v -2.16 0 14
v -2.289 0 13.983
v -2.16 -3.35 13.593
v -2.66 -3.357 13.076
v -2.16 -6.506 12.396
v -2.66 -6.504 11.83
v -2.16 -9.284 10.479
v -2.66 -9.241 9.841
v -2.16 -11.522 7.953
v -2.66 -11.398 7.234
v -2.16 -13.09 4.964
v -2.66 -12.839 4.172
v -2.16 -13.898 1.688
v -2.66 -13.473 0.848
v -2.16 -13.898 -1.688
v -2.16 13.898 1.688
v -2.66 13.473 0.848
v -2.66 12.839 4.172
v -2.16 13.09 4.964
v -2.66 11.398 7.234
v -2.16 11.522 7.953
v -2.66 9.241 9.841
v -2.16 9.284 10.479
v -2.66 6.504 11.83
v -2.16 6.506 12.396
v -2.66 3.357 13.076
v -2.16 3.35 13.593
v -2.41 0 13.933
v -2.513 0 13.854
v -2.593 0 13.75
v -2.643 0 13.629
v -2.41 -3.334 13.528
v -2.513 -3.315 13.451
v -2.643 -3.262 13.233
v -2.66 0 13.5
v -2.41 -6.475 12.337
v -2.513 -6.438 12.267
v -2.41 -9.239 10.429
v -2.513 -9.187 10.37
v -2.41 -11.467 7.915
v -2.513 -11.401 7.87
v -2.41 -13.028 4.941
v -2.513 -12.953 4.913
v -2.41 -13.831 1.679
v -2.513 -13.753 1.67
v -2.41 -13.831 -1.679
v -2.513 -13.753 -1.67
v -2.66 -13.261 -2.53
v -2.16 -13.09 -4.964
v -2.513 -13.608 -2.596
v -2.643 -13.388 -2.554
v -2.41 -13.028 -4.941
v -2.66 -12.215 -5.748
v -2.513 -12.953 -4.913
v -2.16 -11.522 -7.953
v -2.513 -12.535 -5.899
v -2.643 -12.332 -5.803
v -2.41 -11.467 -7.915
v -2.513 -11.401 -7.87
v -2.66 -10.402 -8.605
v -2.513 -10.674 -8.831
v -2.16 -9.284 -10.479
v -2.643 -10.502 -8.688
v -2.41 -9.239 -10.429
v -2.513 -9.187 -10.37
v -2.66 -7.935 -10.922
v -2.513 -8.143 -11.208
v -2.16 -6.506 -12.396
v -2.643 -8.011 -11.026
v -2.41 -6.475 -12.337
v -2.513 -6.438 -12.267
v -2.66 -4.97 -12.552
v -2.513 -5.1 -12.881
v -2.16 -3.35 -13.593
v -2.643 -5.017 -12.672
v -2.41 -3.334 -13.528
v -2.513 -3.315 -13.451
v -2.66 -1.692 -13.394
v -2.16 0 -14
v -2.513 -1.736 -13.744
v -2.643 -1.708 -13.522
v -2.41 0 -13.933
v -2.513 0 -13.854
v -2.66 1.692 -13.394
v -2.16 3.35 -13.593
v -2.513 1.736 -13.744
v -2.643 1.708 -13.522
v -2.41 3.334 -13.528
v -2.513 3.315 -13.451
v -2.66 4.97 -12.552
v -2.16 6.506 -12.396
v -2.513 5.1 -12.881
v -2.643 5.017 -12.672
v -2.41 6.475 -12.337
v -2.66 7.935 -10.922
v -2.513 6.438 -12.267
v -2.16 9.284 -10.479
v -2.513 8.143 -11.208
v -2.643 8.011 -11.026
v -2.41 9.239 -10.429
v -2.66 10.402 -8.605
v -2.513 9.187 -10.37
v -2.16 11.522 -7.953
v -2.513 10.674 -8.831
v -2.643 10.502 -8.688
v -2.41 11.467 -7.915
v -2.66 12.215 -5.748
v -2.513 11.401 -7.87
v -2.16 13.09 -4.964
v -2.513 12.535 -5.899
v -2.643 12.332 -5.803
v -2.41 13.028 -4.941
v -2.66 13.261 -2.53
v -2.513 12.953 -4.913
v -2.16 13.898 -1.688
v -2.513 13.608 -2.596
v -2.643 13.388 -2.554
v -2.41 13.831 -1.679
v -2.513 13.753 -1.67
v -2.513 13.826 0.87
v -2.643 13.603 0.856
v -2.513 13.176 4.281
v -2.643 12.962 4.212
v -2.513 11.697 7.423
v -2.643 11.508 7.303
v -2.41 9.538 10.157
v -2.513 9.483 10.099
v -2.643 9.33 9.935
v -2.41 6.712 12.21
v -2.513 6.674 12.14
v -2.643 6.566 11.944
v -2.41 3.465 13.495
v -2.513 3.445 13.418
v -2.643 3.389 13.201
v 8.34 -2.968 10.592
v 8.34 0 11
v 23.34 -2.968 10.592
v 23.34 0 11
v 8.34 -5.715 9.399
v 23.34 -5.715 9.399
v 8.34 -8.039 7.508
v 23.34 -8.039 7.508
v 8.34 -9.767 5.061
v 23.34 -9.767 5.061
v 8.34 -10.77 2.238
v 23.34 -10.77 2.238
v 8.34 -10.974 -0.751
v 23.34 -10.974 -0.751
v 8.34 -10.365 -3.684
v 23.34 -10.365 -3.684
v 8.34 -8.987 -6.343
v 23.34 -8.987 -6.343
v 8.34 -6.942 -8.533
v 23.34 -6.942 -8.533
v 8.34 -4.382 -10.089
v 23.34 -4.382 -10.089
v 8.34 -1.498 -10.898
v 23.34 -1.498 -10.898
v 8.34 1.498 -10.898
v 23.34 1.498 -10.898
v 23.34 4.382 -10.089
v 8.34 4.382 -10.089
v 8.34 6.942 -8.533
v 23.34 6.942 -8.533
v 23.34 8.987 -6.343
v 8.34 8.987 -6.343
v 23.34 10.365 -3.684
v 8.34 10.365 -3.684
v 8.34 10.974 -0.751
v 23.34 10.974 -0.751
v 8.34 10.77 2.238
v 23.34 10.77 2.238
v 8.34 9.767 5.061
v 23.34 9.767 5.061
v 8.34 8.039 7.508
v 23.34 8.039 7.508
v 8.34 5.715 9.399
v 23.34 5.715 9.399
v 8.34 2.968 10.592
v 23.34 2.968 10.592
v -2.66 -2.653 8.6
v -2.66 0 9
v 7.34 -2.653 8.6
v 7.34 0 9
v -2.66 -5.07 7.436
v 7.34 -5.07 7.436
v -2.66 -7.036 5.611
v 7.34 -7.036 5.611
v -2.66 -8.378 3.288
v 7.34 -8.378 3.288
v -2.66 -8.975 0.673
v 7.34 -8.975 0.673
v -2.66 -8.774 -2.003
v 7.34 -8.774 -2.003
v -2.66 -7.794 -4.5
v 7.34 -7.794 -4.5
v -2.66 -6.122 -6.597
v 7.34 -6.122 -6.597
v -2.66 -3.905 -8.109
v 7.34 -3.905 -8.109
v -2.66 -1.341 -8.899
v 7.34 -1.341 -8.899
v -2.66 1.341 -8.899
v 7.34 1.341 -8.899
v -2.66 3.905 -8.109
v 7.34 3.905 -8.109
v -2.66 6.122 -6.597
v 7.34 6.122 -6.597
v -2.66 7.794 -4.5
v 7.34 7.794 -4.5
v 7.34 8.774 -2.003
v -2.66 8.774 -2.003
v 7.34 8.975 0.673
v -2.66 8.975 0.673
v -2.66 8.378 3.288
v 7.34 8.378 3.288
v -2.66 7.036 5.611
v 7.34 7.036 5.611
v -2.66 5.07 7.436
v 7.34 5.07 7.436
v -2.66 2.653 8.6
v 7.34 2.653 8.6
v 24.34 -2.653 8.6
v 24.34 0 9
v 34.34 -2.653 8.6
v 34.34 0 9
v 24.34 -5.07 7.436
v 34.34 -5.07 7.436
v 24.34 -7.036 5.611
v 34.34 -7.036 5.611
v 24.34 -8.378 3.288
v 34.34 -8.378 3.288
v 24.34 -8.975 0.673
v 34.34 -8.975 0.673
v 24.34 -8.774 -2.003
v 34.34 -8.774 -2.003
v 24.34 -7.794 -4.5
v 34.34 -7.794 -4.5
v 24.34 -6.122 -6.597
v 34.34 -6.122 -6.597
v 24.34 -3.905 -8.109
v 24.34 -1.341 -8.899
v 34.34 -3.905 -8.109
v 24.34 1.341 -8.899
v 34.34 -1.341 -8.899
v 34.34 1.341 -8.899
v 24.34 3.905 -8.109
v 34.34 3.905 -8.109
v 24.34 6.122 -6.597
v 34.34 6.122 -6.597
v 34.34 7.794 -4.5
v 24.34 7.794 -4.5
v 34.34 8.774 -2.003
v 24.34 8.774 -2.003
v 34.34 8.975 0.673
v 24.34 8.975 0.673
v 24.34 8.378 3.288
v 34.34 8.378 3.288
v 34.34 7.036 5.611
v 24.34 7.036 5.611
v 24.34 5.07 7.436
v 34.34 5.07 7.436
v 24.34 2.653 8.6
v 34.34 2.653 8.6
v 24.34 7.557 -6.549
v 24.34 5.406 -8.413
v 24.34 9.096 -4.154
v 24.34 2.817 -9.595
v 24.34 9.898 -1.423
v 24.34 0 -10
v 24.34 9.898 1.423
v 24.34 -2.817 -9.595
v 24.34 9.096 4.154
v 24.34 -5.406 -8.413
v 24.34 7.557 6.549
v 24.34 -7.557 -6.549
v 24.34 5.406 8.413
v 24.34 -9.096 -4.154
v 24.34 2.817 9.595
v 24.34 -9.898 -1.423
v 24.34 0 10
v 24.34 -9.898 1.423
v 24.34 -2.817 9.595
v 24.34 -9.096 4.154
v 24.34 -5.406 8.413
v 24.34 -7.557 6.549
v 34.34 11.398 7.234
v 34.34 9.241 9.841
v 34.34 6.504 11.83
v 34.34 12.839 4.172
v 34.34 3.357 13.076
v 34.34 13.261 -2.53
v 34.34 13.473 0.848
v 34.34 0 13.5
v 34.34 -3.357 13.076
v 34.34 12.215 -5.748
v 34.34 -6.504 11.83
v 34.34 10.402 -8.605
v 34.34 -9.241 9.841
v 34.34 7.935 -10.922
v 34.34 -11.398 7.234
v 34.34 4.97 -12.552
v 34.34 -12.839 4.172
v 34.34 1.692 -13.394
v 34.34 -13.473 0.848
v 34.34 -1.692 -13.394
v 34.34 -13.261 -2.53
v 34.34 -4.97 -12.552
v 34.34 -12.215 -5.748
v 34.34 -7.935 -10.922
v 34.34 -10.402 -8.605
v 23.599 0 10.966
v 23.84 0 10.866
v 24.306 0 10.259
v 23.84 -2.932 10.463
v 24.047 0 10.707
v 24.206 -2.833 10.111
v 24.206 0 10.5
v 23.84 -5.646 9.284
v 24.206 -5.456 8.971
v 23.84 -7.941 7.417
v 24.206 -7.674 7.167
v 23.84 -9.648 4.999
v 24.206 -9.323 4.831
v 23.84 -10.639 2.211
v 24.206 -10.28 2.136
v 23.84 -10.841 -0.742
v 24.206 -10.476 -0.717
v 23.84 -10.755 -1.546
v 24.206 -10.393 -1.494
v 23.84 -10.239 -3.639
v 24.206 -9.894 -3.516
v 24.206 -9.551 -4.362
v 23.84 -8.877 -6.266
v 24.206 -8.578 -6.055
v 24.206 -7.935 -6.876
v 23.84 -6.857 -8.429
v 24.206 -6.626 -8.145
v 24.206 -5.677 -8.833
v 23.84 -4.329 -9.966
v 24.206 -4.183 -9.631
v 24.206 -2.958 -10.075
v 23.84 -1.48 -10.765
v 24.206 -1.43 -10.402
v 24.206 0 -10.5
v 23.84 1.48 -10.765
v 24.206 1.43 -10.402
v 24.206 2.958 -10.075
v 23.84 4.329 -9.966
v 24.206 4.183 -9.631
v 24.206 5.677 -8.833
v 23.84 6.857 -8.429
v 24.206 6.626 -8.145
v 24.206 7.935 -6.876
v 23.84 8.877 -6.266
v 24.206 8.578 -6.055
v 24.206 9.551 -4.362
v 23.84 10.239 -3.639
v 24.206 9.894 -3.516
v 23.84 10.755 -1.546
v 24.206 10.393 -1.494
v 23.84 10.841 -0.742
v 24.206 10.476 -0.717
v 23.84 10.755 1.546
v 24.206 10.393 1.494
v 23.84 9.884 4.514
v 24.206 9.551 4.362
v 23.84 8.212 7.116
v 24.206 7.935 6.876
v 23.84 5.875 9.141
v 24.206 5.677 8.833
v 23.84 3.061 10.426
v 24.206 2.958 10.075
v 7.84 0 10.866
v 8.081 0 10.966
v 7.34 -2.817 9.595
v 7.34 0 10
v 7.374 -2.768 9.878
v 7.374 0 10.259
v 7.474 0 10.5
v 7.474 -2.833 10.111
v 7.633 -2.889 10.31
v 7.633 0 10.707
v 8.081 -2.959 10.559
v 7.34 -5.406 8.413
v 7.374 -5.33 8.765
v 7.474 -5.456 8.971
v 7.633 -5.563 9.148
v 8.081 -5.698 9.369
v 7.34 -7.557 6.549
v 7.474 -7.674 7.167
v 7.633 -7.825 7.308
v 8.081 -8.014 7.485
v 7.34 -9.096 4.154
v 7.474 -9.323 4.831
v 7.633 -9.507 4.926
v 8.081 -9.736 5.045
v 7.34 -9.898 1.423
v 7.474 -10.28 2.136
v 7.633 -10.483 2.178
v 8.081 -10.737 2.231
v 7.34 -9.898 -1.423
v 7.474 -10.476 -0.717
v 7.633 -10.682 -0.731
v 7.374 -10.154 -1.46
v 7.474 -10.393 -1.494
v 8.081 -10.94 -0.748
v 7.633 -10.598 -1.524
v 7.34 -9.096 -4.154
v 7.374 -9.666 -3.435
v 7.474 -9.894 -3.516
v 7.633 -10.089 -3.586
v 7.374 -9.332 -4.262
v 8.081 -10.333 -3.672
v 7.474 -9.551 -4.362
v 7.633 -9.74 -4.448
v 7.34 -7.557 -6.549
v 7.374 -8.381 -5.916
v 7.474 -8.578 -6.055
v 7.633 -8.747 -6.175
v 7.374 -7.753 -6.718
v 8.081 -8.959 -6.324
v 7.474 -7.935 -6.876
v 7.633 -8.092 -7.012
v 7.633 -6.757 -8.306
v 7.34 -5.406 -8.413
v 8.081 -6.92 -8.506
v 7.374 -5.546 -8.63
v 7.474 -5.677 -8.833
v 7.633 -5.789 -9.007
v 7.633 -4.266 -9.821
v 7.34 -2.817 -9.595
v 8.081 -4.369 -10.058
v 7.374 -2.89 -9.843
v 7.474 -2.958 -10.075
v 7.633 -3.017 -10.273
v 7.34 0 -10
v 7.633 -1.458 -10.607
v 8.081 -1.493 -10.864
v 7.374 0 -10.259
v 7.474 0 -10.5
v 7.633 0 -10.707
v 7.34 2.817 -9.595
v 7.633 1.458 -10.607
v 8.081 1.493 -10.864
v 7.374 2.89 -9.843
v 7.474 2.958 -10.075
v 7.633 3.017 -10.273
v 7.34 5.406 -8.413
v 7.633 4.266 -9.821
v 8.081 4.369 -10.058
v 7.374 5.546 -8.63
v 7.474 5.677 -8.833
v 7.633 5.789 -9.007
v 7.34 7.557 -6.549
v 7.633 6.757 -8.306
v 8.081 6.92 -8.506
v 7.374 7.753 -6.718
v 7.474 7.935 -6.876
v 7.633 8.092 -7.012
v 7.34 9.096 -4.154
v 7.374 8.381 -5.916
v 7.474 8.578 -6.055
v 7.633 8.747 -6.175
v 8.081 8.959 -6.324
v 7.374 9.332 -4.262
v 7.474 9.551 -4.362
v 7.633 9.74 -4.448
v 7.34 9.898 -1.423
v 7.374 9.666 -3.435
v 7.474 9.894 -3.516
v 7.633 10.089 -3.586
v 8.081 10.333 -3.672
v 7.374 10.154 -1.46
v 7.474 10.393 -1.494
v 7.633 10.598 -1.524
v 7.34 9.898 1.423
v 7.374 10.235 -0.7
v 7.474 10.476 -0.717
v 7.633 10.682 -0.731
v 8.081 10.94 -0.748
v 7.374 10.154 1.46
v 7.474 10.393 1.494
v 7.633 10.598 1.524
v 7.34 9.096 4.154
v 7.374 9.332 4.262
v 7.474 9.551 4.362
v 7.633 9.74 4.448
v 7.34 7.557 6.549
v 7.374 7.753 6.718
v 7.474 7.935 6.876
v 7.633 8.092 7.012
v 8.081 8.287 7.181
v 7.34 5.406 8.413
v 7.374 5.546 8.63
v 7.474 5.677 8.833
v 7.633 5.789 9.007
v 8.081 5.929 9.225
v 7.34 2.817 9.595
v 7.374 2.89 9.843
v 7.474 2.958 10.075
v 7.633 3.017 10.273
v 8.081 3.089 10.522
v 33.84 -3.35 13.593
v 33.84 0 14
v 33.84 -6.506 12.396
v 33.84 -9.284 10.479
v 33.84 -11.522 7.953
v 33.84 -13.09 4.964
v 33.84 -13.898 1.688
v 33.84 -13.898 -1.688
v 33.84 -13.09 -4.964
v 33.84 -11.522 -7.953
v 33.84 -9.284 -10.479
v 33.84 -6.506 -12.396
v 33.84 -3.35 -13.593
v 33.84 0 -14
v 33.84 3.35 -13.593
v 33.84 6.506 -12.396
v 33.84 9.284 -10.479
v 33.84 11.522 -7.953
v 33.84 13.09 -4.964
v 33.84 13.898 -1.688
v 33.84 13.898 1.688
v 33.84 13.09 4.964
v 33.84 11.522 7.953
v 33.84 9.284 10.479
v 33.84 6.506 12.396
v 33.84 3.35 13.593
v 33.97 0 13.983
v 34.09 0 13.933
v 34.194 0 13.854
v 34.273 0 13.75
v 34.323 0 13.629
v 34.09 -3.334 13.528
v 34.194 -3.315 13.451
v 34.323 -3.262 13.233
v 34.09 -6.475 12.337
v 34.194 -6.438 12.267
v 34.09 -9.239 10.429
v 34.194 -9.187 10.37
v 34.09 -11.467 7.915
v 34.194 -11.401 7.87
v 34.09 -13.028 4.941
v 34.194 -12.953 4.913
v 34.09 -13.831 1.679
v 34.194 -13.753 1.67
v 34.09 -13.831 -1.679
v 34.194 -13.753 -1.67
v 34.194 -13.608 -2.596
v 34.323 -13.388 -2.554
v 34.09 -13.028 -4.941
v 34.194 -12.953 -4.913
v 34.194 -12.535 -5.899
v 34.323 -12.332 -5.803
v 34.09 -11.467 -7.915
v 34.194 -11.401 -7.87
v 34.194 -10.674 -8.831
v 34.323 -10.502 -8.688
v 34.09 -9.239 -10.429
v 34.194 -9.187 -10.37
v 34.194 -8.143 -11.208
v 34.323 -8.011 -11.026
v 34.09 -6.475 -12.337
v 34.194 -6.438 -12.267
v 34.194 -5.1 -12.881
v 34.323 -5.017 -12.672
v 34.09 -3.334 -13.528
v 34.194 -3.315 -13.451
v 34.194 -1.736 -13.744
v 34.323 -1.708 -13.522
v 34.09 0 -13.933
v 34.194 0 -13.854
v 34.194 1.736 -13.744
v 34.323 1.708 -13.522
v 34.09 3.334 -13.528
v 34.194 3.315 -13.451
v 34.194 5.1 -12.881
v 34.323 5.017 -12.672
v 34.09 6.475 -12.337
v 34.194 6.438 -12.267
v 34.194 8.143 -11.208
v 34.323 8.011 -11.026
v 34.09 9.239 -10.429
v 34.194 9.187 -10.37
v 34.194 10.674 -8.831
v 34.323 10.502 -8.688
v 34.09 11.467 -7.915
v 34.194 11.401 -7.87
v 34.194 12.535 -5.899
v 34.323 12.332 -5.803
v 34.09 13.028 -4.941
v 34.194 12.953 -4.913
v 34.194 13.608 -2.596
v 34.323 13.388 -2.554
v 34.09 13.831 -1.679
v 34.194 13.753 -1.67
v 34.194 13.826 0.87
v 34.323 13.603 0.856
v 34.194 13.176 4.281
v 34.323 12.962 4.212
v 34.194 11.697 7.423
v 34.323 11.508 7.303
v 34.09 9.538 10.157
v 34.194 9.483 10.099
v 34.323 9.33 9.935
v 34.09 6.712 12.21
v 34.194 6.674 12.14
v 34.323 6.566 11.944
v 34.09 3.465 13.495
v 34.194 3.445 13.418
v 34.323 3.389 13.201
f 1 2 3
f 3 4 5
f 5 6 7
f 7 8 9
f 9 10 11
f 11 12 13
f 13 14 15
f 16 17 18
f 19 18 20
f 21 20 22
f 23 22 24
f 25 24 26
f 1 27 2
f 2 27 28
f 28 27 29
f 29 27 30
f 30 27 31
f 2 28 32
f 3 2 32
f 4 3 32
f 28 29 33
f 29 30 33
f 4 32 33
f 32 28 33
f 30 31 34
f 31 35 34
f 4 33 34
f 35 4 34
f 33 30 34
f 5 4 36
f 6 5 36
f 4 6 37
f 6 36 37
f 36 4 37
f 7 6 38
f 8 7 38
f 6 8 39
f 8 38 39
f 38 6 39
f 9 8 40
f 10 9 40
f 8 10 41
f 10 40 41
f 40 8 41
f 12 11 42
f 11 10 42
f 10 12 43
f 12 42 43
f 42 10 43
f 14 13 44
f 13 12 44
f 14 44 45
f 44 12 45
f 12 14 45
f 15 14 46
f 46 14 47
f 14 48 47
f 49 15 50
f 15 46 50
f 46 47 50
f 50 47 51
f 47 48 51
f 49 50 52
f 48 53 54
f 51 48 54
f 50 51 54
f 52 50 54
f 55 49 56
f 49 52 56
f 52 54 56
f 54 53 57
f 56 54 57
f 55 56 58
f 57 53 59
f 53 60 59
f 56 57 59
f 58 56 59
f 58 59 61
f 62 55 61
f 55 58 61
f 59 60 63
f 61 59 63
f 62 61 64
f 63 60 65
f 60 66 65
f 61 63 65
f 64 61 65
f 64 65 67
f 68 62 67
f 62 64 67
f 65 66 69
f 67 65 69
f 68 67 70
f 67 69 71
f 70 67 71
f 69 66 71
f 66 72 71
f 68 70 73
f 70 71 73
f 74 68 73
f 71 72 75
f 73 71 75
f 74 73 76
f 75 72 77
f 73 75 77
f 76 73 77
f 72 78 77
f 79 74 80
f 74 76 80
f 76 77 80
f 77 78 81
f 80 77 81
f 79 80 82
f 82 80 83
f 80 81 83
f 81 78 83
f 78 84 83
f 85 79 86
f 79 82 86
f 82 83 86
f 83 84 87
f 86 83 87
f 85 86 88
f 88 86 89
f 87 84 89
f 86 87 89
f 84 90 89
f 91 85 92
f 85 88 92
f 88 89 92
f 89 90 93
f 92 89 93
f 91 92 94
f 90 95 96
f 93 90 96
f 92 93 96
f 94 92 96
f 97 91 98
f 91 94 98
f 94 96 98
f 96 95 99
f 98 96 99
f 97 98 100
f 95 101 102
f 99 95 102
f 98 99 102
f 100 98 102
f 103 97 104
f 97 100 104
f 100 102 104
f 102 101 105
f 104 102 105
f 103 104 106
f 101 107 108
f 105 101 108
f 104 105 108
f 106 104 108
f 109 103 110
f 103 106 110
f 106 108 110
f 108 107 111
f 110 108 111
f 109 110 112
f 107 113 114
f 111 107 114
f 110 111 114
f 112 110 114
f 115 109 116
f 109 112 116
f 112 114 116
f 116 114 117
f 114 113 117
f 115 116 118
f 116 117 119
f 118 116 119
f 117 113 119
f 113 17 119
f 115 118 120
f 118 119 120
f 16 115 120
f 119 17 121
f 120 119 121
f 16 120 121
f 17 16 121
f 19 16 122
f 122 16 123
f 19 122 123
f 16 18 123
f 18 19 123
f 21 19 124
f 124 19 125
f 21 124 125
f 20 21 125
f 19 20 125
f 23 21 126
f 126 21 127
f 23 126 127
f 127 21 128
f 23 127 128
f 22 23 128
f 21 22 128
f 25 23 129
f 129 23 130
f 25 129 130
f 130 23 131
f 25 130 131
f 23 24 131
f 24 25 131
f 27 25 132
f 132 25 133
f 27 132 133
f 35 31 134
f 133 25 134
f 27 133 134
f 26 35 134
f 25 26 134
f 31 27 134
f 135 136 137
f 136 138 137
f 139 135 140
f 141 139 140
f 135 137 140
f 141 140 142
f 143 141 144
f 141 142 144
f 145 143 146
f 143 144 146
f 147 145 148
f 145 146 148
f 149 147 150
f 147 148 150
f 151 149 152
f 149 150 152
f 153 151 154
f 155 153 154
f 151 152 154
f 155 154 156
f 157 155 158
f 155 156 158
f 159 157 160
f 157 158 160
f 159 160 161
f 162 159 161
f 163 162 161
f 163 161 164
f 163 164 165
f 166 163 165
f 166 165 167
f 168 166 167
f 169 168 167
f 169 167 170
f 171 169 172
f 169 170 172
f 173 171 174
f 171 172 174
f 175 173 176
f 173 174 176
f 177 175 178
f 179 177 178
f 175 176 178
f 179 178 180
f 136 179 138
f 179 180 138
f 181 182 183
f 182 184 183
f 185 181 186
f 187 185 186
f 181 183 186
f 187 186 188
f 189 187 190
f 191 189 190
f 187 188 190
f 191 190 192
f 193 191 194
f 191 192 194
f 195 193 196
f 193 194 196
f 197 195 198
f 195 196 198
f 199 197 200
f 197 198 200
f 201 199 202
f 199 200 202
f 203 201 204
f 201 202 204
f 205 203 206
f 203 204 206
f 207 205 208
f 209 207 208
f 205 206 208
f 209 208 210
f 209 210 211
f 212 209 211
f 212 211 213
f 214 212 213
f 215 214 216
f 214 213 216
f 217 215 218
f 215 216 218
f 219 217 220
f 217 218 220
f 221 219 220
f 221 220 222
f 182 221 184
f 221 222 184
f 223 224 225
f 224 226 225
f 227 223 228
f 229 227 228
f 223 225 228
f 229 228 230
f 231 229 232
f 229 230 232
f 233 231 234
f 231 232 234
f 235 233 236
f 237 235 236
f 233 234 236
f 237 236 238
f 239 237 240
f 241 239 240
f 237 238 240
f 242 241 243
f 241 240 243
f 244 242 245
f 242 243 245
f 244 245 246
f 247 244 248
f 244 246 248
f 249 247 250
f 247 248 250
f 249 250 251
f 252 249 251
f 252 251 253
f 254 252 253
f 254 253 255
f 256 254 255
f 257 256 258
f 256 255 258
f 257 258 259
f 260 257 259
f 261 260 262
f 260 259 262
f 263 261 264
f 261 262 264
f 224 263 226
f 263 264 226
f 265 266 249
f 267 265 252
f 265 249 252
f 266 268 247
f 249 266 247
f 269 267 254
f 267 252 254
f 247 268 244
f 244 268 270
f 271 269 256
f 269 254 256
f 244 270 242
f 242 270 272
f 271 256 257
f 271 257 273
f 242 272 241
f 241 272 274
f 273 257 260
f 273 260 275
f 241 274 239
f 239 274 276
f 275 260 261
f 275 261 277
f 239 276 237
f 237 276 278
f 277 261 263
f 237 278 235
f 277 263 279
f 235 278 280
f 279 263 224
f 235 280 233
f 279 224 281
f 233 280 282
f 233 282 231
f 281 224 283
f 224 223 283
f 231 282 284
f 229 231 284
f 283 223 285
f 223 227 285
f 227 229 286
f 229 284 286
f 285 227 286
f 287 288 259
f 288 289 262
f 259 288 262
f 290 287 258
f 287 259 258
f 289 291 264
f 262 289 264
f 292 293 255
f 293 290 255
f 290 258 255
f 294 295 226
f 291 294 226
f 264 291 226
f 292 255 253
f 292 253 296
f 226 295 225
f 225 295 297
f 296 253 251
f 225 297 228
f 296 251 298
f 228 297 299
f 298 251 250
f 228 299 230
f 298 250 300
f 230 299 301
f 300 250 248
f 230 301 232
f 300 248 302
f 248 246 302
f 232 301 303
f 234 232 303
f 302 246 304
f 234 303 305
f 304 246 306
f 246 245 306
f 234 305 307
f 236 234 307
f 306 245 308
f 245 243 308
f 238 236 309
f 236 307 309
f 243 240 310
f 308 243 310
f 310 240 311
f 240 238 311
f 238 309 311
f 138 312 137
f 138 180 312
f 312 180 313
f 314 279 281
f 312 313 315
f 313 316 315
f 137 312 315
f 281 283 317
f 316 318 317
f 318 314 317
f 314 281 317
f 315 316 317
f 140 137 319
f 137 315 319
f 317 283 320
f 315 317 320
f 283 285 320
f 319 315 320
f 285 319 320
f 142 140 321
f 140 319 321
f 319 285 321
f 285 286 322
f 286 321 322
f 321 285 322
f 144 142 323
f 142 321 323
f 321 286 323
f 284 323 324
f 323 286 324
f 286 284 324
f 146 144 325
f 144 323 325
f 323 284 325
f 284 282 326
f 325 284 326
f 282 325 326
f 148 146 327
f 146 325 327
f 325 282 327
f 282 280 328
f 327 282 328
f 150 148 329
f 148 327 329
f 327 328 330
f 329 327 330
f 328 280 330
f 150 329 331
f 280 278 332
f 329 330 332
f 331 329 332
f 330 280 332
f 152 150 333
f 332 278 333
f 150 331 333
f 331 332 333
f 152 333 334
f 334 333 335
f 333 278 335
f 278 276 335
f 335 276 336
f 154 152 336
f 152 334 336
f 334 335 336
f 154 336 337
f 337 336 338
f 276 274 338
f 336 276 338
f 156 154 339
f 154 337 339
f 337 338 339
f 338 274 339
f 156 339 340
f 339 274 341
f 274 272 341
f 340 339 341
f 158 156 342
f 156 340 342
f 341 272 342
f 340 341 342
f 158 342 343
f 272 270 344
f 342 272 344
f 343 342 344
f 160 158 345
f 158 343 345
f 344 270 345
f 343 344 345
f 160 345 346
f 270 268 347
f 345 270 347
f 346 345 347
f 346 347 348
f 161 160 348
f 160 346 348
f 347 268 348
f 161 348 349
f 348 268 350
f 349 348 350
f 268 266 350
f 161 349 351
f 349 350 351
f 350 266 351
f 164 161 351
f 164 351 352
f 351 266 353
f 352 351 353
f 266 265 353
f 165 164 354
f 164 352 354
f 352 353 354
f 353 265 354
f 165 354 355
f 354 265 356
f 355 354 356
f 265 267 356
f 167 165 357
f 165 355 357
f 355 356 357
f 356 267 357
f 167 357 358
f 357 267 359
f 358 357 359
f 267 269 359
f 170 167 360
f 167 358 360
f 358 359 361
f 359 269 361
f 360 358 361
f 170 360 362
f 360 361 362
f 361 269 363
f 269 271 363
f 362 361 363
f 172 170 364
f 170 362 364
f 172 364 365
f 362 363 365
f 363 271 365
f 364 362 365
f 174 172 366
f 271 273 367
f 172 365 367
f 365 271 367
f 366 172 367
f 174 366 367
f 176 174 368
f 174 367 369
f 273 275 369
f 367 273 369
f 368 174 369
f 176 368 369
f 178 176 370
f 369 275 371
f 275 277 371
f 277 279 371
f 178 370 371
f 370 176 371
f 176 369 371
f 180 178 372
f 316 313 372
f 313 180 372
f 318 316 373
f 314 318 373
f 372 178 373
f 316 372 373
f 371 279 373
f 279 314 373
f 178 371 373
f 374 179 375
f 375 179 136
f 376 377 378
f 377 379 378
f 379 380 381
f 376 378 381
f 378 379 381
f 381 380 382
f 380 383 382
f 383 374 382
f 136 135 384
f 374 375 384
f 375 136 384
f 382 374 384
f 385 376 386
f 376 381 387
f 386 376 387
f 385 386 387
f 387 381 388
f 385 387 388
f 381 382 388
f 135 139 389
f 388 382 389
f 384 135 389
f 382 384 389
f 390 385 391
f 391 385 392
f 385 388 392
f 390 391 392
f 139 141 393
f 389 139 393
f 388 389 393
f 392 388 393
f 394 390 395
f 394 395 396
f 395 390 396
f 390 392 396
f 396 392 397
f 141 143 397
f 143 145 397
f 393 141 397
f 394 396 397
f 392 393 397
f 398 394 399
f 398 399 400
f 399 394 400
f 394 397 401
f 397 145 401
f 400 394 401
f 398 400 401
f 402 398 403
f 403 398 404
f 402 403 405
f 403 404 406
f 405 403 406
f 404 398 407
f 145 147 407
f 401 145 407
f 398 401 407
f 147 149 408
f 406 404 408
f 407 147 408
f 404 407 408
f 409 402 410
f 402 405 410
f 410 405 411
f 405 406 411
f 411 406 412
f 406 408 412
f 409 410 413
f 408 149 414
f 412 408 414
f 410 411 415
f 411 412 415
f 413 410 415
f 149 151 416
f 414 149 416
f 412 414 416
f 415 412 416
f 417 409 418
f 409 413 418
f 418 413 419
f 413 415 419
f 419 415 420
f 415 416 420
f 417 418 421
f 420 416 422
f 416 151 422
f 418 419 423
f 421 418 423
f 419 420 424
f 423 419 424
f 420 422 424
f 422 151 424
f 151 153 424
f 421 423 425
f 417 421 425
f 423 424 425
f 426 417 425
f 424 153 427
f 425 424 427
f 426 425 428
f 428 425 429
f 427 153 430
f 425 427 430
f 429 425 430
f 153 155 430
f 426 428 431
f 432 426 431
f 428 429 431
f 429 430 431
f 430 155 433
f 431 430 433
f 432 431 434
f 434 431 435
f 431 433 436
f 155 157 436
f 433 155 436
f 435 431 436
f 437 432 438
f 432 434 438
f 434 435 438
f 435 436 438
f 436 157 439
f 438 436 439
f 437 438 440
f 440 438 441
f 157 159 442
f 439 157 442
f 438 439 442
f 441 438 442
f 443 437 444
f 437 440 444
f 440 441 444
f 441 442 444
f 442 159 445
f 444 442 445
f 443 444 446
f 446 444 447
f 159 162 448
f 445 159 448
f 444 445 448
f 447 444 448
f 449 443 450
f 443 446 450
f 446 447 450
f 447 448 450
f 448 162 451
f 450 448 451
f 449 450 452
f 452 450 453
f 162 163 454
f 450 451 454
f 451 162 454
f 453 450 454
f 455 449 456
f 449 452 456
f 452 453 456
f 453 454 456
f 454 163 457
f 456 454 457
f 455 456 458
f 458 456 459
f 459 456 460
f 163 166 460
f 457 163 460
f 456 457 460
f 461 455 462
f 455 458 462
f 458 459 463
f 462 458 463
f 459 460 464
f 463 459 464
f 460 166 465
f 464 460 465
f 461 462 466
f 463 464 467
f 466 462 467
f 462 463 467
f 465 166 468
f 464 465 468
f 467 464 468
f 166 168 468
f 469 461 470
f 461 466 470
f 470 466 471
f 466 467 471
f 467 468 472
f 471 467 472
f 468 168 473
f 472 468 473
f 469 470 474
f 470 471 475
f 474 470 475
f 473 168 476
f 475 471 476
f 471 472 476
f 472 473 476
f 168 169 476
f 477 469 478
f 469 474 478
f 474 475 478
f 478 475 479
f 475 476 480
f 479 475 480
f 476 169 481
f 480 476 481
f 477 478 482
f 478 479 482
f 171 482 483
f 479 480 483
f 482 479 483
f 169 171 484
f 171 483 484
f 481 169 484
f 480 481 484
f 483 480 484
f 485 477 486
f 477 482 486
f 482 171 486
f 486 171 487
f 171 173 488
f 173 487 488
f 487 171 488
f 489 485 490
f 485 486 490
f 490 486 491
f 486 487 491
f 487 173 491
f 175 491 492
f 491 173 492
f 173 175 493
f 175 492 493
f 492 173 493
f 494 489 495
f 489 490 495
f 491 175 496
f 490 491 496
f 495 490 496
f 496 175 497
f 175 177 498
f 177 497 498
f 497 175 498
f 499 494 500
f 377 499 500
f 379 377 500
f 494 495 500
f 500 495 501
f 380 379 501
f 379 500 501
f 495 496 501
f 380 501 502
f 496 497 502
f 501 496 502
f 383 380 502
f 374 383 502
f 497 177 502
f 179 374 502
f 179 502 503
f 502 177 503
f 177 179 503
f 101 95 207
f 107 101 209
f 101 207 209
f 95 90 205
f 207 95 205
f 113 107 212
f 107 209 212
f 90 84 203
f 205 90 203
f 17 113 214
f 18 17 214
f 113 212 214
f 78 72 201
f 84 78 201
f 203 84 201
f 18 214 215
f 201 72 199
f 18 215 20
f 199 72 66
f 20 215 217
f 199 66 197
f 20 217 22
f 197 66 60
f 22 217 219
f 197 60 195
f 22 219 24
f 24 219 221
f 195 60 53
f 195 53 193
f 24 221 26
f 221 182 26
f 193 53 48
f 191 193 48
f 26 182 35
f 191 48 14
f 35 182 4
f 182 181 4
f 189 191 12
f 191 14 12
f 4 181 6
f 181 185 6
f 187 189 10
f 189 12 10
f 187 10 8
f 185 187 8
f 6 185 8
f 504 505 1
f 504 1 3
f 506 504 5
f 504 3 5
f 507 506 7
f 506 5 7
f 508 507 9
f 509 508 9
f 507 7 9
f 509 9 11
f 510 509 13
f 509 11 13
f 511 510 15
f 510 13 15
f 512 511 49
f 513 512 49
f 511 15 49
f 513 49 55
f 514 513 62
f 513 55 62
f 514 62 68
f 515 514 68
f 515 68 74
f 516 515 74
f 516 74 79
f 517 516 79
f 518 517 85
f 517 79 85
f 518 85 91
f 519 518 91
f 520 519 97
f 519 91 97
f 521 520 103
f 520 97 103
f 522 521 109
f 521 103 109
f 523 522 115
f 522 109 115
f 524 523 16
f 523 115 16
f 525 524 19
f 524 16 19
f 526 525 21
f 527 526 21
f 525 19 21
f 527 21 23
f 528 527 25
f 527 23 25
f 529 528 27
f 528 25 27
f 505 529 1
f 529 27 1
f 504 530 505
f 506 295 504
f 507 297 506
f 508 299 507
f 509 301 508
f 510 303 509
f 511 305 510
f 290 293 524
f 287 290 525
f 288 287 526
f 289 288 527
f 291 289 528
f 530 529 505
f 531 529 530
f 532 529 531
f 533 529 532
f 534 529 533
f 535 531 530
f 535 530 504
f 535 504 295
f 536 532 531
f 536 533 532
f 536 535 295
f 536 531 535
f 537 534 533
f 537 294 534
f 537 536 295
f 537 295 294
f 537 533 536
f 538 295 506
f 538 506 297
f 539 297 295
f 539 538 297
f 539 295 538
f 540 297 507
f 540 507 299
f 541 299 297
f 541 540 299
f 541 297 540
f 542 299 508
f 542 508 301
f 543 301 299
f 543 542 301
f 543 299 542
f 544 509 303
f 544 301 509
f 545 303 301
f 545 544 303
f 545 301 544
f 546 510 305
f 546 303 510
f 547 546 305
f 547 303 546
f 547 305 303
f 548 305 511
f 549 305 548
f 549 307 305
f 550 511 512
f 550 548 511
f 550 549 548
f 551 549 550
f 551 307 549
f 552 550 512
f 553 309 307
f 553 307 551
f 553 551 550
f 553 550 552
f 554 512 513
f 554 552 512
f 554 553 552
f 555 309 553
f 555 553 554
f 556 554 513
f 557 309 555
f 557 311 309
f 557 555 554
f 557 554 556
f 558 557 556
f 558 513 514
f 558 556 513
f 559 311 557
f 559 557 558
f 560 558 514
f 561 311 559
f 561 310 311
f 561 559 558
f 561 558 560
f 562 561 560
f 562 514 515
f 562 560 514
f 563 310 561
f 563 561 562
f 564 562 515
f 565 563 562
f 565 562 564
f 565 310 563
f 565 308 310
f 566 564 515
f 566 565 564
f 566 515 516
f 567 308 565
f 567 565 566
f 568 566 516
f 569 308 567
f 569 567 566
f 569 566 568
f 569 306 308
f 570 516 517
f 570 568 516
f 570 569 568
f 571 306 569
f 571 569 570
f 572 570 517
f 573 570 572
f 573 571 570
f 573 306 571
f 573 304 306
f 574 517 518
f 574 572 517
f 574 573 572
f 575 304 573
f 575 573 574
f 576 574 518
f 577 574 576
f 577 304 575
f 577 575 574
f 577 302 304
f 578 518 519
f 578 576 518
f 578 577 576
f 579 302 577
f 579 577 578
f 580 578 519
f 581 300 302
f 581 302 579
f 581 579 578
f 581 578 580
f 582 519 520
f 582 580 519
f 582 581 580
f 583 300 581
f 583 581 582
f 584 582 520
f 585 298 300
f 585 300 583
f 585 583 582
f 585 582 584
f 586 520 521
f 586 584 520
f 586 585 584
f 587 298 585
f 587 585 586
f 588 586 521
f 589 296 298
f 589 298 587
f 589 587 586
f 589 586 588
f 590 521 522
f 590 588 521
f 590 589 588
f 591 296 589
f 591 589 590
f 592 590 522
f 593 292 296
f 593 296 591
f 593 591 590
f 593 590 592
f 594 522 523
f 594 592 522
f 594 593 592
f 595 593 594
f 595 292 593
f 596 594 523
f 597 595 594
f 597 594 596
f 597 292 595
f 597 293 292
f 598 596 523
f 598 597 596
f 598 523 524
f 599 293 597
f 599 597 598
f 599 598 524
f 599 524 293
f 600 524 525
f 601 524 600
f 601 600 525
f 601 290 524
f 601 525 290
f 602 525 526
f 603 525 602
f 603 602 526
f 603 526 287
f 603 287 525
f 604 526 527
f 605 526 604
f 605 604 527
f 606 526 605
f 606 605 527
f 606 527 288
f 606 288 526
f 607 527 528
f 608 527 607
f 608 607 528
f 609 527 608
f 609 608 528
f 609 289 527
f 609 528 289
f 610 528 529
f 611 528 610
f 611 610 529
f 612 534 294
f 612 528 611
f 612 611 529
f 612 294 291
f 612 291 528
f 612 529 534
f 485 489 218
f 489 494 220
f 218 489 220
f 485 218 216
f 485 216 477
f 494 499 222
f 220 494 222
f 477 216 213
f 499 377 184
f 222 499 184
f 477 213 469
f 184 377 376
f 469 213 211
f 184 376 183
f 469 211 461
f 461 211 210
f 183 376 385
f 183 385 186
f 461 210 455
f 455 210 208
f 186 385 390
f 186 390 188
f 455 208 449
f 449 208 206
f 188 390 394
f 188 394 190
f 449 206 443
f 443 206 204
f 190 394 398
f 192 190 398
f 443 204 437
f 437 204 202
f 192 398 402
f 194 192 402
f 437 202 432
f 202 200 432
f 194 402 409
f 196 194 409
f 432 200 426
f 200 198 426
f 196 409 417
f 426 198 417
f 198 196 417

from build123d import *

# Parameters (mm, degrees)
F2_R = 0.5


with BuildPart() as f1:
    # F0 (on Front) → F1 (revolve)
    with BuildSketch(Plane.XZ):
        with BuildLine():
            Line((34.340206, 14), (-2.659794, 14))
            Line((-2.659794, 14), (-2.659794, 9))
            Line((-2.659794, 9), (7.340206, 9))
            Line((7.340206, 9), (7.340206, 10))
            ThreePointArc((7.340206, 10), (7.633099, 10.707107), (8.340206, 11))
            Line((8.340206, 11), (23.340206, 11))
            ThreePointArc((23.340206, 11), (24.047313, 10.707107), (24.340206, 10))
            Line((24.340206, 10), (24.340206, 9))
            Line((24.340206, 9), (34.340206, 9))
            Line((34.340206, 9), (34.340206, 14))
        make_face()
    revolve(axis=Axis((-0.122449, 0, 0), (1, 0, 0)))

    # F2
    f2_edges = [f1.edges().sort_by_distance(p)[0] for p in [
        (-2.659794, 0, -14),
        (34.340206, 0, -14),
    ]]
    fillet(f2_edges, radius=F2_R)


solid = f1.part
